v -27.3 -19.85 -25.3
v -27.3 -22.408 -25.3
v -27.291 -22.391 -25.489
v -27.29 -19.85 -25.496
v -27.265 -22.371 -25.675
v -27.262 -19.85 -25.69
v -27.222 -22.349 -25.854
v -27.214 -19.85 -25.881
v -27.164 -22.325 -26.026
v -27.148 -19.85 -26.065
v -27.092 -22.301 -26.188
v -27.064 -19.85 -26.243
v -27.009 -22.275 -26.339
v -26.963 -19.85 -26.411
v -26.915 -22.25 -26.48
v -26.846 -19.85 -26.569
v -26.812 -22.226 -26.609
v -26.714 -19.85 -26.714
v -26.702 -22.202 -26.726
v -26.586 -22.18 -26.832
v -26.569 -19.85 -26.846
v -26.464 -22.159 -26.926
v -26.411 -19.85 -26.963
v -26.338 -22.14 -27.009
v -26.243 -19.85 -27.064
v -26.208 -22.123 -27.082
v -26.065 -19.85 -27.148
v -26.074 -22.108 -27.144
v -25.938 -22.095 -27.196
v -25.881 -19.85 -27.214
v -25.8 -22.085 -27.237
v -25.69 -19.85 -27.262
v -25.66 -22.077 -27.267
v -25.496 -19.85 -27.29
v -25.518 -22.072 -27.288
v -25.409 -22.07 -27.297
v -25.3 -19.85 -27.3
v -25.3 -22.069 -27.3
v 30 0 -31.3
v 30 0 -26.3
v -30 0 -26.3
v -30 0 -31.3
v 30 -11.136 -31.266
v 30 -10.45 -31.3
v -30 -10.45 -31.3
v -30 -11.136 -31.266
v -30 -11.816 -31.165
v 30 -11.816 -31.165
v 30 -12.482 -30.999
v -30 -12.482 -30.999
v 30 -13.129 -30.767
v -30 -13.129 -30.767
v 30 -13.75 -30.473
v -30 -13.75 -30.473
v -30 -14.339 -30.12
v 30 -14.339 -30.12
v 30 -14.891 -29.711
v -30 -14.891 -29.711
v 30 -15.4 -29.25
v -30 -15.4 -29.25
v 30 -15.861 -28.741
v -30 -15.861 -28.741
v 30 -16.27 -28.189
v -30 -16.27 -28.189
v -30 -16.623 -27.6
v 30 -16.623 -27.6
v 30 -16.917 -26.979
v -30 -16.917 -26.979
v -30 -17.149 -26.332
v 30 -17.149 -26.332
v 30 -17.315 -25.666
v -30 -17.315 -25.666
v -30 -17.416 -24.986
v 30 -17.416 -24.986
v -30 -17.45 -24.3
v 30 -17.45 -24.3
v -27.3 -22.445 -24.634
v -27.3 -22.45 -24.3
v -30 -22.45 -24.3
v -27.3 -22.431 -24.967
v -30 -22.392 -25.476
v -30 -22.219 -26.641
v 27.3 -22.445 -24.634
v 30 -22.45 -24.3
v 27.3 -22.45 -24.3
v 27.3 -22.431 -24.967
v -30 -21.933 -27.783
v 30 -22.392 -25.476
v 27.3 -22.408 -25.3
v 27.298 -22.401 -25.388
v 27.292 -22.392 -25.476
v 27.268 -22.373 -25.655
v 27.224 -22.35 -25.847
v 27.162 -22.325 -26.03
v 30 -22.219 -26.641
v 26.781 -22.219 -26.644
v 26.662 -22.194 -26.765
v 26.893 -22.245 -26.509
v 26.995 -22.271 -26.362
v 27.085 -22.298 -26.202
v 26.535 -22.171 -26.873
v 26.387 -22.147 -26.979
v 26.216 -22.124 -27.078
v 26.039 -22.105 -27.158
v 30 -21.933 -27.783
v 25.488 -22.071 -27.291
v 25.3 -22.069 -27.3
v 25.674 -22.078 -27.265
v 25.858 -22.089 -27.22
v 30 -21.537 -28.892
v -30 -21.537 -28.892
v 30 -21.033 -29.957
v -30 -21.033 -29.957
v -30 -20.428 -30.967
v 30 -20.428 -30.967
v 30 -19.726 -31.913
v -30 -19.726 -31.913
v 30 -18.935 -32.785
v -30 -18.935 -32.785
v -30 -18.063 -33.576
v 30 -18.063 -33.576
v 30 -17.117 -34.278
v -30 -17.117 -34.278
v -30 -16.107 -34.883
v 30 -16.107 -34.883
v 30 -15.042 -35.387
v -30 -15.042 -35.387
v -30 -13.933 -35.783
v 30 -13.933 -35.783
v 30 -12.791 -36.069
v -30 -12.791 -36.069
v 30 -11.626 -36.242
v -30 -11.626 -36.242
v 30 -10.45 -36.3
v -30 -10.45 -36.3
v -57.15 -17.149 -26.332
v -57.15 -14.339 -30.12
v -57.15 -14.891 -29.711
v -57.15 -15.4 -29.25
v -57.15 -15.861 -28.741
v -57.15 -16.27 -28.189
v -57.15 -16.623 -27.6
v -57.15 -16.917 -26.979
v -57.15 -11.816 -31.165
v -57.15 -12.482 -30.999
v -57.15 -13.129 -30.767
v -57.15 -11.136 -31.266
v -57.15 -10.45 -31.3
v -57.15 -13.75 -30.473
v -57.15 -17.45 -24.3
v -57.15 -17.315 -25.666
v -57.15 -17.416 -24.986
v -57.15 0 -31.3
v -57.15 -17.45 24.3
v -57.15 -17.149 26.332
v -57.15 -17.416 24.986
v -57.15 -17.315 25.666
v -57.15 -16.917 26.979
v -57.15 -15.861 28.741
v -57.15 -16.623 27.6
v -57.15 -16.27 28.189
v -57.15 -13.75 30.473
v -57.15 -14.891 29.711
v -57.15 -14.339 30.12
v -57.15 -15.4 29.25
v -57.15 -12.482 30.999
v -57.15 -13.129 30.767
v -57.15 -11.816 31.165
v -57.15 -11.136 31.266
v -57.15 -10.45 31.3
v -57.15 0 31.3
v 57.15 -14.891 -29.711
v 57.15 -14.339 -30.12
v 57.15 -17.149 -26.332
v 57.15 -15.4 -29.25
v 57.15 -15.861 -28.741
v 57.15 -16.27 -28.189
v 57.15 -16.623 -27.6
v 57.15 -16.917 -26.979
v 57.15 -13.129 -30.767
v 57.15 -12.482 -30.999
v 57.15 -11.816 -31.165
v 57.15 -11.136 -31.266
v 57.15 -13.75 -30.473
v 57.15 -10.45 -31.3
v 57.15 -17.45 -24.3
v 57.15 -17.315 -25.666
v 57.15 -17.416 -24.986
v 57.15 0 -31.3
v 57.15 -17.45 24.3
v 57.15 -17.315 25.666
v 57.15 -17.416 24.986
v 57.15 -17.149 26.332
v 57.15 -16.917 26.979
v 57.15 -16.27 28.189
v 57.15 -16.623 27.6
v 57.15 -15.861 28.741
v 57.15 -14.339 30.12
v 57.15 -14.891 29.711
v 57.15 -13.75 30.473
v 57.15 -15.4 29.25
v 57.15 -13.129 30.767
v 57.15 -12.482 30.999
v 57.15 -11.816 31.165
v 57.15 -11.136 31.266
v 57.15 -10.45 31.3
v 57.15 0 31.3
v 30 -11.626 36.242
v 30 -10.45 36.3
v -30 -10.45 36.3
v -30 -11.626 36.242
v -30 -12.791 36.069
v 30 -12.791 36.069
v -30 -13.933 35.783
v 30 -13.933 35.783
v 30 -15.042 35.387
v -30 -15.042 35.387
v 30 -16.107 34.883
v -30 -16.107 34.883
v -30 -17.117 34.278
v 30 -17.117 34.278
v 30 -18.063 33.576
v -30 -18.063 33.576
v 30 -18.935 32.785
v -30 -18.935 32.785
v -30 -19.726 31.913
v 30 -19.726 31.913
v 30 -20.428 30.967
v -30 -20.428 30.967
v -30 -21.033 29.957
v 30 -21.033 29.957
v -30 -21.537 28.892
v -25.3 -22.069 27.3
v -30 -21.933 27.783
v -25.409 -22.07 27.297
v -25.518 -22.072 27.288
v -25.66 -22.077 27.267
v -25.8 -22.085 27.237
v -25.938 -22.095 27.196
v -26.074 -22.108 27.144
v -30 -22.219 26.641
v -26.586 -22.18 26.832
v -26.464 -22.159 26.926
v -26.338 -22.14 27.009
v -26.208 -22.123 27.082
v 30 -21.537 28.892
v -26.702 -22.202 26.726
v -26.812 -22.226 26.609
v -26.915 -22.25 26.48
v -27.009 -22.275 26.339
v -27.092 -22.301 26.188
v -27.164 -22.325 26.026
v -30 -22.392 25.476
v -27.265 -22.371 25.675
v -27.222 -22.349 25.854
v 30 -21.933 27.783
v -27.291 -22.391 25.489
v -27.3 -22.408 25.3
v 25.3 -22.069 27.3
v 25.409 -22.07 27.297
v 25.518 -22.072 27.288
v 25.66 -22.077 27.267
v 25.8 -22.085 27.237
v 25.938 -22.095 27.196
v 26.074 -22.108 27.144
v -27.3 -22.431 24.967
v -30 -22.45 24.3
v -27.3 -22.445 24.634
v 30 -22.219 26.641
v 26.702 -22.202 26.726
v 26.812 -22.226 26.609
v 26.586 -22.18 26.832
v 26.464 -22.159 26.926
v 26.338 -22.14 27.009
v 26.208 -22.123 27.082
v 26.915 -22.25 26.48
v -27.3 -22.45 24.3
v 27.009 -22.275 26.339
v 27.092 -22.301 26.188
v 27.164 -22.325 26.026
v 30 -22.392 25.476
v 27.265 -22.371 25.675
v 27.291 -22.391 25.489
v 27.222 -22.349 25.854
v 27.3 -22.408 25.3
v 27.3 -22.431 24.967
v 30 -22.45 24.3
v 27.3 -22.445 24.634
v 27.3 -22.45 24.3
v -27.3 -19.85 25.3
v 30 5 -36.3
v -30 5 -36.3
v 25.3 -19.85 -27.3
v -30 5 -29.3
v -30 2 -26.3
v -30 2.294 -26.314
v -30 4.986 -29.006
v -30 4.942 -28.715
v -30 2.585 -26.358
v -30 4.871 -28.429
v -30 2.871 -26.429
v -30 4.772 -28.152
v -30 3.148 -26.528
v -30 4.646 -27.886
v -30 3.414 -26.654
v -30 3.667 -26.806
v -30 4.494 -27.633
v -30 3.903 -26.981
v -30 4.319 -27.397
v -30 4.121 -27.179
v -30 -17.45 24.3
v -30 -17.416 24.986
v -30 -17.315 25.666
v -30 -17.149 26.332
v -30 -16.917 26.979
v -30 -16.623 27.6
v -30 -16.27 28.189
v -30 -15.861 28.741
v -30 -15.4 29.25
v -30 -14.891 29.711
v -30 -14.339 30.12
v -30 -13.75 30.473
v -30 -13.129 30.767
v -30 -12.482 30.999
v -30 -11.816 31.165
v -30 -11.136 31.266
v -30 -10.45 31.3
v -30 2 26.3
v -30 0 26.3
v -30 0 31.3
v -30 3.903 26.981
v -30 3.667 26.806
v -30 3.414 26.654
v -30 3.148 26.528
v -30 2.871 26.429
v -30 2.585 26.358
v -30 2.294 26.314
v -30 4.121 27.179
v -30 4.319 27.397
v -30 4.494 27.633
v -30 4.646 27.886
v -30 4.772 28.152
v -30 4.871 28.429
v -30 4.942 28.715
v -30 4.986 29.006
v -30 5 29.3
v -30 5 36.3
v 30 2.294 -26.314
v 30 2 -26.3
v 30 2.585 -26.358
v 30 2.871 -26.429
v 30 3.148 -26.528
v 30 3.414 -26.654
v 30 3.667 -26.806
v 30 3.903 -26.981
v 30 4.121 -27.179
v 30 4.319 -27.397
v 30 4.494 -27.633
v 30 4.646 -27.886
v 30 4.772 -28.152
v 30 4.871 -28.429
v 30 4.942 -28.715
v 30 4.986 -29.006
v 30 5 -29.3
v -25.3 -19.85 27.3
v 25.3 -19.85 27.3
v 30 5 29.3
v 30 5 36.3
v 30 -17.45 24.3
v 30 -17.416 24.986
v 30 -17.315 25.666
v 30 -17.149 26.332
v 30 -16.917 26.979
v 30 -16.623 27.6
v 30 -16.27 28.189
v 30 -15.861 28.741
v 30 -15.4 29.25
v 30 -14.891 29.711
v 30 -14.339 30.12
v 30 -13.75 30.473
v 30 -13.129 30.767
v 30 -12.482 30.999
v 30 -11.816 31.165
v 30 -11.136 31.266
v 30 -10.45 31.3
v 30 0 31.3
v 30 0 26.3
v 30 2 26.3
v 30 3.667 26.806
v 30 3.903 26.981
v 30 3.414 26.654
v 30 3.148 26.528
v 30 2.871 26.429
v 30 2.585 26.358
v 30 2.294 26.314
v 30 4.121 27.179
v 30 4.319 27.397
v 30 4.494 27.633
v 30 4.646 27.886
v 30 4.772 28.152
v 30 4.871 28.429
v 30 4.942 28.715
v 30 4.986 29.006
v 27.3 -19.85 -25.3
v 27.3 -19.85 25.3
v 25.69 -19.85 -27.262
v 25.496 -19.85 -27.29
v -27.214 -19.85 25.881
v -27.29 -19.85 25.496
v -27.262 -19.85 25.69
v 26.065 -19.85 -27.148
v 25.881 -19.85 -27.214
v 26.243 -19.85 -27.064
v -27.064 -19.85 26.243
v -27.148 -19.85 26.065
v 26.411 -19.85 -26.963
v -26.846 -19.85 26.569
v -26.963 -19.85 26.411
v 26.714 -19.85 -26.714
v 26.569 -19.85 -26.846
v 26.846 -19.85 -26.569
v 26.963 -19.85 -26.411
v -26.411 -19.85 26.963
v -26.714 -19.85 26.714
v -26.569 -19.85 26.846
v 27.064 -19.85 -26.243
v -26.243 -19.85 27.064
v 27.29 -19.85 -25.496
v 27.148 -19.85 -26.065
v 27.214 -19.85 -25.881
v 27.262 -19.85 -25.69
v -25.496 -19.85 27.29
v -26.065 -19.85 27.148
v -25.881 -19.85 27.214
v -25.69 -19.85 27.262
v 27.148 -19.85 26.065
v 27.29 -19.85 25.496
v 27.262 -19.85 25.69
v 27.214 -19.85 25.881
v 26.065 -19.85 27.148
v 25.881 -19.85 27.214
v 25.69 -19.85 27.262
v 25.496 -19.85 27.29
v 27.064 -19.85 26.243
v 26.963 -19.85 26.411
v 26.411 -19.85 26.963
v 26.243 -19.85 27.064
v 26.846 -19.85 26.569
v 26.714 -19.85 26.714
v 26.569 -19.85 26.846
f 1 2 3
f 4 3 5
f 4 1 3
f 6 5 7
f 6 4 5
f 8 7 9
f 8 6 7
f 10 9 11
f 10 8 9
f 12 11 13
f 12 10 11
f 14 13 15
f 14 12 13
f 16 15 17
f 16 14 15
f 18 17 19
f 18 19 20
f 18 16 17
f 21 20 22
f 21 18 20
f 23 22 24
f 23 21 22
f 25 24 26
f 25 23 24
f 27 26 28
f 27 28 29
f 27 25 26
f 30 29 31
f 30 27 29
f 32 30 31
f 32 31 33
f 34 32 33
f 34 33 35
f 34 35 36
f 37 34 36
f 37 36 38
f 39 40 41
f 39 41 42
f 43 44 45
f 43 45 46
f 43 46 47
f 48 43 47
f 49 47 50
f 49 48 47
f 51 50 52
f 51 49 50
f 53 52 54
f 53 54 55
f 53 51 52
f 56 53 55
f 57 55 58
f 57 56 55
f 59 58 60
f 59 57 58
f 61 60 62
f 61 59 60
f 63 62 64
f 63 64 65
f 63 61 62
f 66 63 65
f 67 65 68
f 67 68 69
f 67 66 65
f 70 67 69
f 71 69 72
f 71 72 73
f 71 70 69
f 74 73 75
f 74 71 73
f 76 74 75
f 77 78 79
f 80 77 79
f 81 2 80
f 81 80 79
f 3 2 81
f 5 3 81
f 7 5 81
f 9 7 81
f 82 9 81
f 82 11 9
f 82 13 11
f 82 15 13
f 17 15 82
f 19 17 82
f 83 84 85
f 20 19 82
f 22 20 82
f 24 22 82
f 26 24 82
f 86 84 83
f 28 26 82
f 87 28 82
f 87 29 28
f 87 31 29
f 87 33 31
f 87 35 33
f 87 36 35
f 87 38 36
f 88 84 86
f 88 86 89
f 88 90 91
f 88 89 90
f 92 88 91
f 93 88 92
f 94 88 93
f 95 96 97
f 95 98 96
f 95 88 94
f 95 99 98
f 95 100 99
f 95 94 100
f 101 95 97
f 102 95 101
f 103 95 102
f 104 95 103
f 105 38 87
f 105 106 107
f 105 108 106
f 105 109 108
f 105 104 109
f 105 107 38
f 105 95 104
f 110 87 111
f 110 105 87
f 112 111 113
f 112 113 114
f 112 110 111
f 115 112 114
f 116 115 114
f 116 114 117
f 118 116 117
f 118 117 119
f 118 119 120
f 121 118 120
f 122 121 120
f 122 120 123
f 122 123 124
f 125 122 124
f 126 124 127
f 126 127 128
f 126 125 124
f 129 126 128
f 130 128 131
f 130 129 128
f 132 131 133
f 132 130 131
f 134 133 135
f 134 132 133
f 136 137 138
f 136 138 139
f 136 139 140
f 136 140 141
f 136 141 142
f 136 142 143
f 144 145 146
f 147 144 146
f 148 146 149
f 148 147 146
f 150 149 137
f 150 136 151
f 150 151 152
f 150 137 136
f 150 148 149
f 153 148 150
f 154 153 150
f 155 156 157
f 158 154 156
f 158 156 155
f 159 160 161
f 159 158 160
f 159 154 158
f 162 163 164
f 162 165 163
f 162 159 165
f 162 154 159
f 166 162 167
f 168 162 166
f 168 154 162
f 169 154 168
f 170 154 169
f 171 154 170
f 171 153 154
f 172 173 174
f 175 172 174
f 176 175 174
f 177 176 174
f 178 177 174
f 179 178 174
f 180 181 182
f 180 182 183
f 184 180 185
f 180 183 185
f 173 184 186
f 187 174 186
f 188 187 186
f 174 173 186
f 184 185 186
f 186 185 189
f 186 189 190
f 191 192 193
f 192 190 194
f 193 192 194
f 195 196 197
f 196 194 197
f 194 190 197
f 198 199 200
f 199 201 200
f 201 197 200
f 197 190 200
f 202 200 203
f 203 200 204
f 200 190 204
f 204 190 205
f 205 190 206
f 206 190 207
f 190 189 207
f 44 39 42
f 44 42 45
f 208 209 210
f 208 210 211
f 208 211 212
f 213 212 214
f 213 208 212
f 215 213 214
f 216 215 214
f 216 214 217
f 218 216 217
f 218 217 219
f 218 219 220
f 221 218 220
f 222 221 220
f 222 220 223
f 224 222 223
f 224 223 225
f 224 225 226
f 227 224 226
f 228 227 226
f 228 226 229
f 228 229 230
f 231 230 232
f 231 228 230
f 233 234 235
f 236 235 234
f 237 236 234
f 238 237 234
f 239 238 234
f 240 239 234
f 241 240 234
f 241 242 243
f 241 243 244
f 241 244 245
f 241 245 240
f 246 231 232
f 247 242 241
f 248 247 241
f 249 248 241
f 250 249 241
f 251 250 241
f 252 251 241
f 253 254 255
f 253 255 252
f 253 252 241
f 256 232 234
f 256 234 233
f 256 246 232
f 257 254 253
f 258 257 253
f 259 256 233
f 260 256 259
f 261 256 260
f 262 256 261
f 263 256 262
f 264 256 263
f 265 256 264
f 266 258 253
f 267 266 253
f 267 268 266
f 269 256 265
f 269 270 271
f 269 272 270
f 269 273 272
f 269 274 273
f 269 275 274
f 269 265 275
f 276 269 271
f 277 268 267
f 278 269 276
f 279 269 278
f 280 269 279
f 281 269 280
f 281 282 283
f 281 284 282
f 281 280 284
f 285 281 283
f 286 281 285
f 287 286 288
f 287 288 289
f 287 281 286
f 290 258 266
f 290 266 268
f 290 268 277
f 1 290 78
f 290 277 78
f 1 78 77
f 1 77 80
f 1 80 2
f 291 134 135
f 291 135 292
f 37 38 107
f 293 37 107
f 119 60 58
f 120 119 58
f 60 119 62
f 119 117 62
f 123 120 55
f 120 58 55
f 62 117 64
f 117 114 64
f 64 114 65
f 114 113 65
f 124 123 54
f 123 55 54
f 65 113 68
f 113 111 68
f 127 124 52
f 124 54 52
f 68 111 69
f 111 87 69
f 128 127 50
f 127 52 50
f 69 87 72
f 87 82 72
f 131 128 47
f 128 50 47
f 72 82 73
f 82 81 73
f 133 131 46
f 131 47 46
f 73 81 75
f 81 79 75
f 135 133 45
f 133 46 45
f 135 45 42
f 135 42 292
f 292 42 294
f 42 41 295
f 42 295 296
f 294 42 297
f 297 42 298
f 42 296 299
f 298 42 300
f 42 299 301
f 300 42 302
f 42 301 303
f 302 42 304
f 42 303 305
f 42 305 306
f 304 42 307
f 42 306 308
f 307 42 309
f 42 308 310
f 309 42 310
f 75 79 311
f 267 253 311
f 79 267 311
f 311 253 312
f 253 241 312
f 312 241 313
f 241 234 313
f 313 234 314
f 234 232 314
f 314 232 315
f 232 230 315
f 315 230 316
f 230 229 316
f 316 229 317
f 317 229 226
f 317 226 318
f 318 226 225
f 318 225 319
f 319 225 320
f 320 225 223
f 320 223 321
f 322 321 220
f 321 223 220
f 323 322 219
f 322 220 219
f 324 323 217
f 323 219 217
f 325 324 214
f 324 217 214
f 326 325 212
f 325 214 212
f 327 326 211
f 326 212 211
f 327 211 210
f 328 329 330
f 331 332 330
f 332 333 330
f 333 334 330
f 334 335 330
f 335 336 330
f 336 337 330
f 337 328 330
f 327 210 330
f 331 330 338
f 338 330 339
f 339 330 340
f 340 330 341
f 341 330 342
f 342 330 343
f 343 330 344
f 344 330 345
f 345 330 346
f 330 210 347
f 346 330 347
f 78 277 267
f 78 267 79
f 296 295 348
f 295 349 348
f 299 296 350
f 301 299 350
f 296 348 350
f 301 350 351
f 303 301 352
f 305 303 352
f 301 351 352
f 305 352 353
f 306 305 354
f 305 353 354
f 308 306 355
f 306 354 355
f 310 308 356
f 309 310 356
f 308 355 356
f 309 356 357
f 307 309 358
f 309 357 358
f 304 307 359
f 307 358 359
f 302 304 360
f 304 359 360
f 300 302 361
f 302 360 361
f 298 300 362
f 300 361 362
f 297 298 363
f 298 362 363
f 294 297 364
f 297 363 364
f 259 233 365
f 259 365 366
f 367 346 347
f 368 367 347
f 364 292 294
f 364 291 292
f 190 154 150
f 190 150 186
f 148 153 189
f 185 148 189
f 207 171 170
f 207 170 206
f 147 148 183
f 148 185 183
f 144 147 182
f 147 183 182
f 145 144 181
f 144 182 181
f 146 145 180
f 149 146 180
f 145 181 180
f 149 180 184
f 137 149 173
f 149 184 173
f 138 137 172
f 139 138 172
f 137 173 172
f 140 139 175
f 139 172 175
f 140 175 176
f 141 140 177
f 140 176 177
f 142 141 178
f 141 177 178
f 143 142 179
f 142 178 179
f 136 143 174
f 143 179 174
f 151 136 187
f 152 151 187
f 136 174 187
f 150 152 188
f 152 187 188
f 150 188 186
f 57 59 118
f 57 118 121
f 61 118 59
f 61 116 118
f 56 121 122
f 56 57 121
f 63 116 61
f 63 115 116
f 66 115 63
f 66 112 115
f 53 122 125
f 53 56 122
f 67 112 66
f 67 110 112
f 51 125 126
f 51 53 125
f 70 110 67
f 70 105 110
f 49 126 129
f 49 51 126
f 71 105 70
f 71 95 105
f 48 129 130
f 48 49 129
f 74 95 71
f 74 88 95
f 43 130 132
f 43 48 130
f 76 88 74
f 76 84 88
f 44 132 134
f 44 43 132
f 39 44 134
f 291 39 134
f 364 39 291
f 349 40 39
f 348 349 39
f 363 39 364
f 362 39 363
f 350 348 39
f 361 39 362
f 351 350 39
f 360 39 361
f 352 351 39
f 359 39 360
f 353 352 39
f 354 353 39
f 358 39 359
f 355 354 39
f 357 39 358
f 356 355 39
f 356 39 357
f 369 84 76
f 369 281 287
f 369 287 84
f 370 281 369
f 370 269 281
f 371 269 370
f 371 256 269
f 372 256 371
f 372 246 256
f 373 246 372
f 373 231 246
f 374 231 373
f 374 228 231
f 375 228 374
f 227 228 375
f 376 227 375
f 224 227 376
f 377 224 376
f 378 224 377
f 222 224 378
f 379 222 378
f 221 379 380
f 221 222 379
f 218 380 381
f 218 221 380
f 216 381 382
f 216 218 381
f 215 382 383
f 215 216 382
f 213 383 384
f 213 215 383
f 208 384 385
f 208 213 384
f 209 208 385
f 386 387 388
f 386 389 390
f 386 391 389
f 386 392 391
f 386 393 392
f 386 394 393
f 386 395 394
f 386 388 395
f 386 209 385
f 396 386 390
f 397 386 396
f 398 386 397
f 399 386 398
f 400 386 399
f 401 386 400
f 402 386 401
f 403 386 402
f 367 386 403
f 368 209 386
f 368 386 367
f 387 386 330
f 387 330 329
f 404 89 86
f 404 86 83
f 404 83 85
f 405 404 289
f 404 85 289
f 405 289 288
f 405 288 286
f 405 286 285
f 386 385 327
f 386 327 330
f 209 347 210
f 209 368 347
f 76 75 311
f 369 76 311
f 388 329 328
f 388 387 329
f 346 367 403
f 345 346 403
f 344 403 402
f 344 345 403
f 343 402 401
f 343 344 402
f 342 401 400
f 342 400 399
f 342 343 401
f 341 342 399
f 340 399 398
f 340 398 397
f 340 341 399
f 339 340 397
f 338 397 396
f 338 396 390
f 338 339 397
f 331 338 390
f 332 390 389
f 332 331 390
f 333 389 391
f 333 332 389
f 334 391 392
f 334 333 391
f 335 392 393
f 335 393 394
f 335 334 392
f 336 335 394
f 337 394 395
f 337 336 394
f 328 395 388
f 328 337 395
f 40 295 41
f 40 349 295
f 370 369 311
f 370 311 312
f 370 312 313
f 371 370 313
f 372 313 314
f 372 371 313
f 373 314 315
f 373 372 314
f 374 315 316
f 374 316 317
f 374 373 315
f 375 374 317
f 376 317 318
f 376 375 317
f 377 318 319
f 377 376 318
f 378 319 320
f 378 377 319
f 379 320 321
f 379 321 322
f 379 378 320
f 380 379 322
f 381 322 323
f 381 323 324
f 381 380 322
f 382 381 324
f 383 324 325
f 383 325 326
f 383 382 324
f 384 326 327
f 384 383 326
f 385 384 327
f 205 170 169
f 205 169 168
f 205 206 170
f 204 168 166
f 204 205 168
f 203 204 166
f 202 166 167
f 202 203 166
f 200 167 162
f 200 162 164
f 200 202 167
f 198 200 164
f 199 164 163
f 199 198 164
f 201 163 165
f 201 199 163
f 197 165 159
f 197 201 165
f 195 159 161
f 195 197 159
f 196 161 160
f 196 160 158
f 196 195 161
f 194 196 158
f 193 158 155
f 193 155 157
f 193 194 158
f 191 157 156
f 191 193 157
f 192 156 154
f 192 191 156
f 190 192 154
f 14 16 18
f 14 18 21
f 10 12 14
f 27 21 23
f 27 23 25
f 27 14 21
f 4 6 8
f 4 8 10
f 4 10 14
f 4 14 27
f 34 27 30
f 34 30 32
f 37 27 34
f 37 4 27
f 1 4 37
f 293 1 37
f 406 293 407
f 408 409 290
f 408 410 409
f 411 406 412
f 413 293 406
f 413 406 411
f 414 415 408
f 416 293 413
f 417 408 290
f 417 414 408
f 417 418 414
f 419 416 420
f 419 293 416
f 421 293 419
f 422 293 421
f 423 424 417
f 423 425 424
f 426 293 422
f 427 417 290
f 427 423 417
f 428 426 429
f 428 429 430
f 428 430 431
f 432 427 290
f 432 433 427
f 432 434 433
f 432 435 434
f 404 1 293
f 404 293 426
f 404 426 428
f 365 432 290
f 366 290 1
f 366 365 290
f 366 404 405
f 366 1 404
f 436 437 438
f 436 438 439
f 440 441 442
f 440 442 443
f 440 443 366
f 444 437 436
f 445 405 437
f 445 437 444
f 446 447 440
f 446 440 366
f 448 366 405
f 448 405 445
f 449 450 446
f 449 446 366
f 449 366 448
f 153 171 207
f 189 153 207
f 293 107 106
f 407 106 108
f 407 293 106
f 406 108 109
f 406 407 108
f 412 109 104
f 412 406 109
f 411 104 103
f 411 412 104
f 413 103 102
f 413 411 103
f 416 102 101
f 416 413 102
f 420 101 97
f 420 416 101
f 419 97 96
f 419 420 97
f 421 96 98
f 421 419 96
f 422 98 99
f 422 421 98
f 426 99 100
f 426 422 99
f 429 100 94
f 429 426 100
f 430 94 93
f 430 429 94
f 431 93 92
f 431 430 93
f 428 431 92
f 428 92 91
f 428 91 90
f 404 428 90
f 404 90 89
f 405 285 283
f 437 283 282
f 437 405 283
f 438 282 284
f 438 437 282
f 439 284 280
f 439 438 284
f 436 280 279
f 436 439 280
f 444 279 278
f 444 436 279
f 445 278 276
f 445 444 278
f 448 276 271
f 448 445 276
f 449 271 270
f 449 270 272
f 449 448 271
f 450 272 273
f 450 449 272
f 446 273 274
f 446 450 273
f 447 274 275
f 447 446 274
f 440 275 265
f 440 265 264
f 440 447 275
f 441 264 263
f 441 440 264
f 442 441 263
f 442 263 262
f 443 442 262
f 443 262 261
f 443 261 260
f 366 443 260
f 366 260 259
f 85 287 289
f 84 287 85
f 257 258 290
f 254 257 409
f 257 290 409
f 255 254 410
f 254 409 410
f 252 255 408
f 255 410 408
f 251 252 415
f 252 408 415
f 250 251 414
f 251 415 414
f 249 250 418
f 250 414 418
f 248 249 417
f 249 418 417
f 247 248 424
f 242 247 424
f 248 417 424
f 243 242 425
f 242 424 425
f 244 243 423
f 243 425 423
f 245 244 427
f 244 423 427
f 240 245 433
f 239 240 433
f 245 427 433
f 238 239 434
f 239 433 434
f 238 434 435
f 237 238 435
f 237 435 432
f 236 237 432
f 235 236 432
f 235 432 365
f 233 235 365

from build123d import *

# Parameters (mm, degrees)
F0_W     = 114.3
F0_H     = 62.6
F1_DEPTH = 17.45
F2_R     = 7
F4_DEPTH = 30
F5_R     = 3
F6_W     = 54.6
F6_H     = 3
F6_H_2   = 48.6
F7_DEPTH = 2.6
F8_R     = 2


with BuildPart() as f1:
    # F0 (on Front) → F1 (new body)
    with BuildSketch(Plane.XZ):
        Rectangle(F0_W, F0_H)
    extrude(amount=F1_DEPTH)

    # F2
    f2_edges = [f1.edges().sort_by_distance(p)[0] for p in [
        (0, -17.45, 31.3),
        (0, -17.45, -31.3),
    ]]
    fillet(f2_edges, radius=F2_R)


with BuildPart() as f4:
    # F3 (on Right) → F4 (new body, symmetric)
    with BuildSketch(Plane.YZ):
        with BuildLine():
            Line((5, 36.3), (-10.45, 36.3))
            ThreePointArc((-10.45, 36.3), (-18.9352813742, 32.7852813742), (-22.45, 24.3))
            Line((-22.45, 24.3), (-22.45, -24.3))
            ThreePointArc((-22.45, -24.3), (-18.9352813742, -32.7852813742), (-10.45, -36.3))
            Line((-10.45, -36.3), (5, -36.3))
            Line((5, -36.3), (5, -26.3))
            Line((5, -26.3), (0, -26.3))
            Line((0, -26.3), (0, -31.3))
            Line((0, -31.3), (-10.45, -31.3))
            ThreePointArc((-10.45, -31.3), (-15.3997474683, -29.2497474683), (-17.45, -24.3))
            Line((-17.45, -24.3), (-17.45, 24.3))
            ThreePointArc((-17.45, 24.3), (-15.3997474683, 29.2497474683), (-10.45, 31.3))
            Line((-10.45, 31.3), (0, 31.3))
            Line((0, 31.3), (0, 26.3))
            Line((0, 26.3), (5, 26.3))
            Line((5, 26.3), (5, 36.3))
        make_face()
    extrude(amount=F4_DEPTH, both=True)

    # F5
    f5_edges = [f4.edges().sort_by_distance(p)[0] for p in [
        (0, 5, 26.3),
        (0, 5, -26.3),
    ]]
    fillet(f5_edges, radius=F5_R)

    # F6 (on face) → F7 (cut)
    with BuildSketch(Plane.XZ.offset(22.45)):
        with Locations((0, 25.8)):
            Rectangle(F6_W, F6_H)
        with Locations((0, -25.8)):
            Rectangle(F6_W, F6_H)
        Rectangle(F6_W, F6_H_2)
    extrude(amount=-F7_DEPTH, mode=Mode.SUBTRACT)

    # F8
    f8_edges = [f4.edges().sort_by_distance(p)[0] for p in [
        (-27.3, -20.959475, 27.3),
        (27.3, -20.959475, 27.3),
        (27.3, -20.959475, -27.3),
        (-27.3, -20.959475, -27.3),
    ]]
    fillet(f8_edges, radius=F8_R)


solid = Compound([f1.part, f4.part])
